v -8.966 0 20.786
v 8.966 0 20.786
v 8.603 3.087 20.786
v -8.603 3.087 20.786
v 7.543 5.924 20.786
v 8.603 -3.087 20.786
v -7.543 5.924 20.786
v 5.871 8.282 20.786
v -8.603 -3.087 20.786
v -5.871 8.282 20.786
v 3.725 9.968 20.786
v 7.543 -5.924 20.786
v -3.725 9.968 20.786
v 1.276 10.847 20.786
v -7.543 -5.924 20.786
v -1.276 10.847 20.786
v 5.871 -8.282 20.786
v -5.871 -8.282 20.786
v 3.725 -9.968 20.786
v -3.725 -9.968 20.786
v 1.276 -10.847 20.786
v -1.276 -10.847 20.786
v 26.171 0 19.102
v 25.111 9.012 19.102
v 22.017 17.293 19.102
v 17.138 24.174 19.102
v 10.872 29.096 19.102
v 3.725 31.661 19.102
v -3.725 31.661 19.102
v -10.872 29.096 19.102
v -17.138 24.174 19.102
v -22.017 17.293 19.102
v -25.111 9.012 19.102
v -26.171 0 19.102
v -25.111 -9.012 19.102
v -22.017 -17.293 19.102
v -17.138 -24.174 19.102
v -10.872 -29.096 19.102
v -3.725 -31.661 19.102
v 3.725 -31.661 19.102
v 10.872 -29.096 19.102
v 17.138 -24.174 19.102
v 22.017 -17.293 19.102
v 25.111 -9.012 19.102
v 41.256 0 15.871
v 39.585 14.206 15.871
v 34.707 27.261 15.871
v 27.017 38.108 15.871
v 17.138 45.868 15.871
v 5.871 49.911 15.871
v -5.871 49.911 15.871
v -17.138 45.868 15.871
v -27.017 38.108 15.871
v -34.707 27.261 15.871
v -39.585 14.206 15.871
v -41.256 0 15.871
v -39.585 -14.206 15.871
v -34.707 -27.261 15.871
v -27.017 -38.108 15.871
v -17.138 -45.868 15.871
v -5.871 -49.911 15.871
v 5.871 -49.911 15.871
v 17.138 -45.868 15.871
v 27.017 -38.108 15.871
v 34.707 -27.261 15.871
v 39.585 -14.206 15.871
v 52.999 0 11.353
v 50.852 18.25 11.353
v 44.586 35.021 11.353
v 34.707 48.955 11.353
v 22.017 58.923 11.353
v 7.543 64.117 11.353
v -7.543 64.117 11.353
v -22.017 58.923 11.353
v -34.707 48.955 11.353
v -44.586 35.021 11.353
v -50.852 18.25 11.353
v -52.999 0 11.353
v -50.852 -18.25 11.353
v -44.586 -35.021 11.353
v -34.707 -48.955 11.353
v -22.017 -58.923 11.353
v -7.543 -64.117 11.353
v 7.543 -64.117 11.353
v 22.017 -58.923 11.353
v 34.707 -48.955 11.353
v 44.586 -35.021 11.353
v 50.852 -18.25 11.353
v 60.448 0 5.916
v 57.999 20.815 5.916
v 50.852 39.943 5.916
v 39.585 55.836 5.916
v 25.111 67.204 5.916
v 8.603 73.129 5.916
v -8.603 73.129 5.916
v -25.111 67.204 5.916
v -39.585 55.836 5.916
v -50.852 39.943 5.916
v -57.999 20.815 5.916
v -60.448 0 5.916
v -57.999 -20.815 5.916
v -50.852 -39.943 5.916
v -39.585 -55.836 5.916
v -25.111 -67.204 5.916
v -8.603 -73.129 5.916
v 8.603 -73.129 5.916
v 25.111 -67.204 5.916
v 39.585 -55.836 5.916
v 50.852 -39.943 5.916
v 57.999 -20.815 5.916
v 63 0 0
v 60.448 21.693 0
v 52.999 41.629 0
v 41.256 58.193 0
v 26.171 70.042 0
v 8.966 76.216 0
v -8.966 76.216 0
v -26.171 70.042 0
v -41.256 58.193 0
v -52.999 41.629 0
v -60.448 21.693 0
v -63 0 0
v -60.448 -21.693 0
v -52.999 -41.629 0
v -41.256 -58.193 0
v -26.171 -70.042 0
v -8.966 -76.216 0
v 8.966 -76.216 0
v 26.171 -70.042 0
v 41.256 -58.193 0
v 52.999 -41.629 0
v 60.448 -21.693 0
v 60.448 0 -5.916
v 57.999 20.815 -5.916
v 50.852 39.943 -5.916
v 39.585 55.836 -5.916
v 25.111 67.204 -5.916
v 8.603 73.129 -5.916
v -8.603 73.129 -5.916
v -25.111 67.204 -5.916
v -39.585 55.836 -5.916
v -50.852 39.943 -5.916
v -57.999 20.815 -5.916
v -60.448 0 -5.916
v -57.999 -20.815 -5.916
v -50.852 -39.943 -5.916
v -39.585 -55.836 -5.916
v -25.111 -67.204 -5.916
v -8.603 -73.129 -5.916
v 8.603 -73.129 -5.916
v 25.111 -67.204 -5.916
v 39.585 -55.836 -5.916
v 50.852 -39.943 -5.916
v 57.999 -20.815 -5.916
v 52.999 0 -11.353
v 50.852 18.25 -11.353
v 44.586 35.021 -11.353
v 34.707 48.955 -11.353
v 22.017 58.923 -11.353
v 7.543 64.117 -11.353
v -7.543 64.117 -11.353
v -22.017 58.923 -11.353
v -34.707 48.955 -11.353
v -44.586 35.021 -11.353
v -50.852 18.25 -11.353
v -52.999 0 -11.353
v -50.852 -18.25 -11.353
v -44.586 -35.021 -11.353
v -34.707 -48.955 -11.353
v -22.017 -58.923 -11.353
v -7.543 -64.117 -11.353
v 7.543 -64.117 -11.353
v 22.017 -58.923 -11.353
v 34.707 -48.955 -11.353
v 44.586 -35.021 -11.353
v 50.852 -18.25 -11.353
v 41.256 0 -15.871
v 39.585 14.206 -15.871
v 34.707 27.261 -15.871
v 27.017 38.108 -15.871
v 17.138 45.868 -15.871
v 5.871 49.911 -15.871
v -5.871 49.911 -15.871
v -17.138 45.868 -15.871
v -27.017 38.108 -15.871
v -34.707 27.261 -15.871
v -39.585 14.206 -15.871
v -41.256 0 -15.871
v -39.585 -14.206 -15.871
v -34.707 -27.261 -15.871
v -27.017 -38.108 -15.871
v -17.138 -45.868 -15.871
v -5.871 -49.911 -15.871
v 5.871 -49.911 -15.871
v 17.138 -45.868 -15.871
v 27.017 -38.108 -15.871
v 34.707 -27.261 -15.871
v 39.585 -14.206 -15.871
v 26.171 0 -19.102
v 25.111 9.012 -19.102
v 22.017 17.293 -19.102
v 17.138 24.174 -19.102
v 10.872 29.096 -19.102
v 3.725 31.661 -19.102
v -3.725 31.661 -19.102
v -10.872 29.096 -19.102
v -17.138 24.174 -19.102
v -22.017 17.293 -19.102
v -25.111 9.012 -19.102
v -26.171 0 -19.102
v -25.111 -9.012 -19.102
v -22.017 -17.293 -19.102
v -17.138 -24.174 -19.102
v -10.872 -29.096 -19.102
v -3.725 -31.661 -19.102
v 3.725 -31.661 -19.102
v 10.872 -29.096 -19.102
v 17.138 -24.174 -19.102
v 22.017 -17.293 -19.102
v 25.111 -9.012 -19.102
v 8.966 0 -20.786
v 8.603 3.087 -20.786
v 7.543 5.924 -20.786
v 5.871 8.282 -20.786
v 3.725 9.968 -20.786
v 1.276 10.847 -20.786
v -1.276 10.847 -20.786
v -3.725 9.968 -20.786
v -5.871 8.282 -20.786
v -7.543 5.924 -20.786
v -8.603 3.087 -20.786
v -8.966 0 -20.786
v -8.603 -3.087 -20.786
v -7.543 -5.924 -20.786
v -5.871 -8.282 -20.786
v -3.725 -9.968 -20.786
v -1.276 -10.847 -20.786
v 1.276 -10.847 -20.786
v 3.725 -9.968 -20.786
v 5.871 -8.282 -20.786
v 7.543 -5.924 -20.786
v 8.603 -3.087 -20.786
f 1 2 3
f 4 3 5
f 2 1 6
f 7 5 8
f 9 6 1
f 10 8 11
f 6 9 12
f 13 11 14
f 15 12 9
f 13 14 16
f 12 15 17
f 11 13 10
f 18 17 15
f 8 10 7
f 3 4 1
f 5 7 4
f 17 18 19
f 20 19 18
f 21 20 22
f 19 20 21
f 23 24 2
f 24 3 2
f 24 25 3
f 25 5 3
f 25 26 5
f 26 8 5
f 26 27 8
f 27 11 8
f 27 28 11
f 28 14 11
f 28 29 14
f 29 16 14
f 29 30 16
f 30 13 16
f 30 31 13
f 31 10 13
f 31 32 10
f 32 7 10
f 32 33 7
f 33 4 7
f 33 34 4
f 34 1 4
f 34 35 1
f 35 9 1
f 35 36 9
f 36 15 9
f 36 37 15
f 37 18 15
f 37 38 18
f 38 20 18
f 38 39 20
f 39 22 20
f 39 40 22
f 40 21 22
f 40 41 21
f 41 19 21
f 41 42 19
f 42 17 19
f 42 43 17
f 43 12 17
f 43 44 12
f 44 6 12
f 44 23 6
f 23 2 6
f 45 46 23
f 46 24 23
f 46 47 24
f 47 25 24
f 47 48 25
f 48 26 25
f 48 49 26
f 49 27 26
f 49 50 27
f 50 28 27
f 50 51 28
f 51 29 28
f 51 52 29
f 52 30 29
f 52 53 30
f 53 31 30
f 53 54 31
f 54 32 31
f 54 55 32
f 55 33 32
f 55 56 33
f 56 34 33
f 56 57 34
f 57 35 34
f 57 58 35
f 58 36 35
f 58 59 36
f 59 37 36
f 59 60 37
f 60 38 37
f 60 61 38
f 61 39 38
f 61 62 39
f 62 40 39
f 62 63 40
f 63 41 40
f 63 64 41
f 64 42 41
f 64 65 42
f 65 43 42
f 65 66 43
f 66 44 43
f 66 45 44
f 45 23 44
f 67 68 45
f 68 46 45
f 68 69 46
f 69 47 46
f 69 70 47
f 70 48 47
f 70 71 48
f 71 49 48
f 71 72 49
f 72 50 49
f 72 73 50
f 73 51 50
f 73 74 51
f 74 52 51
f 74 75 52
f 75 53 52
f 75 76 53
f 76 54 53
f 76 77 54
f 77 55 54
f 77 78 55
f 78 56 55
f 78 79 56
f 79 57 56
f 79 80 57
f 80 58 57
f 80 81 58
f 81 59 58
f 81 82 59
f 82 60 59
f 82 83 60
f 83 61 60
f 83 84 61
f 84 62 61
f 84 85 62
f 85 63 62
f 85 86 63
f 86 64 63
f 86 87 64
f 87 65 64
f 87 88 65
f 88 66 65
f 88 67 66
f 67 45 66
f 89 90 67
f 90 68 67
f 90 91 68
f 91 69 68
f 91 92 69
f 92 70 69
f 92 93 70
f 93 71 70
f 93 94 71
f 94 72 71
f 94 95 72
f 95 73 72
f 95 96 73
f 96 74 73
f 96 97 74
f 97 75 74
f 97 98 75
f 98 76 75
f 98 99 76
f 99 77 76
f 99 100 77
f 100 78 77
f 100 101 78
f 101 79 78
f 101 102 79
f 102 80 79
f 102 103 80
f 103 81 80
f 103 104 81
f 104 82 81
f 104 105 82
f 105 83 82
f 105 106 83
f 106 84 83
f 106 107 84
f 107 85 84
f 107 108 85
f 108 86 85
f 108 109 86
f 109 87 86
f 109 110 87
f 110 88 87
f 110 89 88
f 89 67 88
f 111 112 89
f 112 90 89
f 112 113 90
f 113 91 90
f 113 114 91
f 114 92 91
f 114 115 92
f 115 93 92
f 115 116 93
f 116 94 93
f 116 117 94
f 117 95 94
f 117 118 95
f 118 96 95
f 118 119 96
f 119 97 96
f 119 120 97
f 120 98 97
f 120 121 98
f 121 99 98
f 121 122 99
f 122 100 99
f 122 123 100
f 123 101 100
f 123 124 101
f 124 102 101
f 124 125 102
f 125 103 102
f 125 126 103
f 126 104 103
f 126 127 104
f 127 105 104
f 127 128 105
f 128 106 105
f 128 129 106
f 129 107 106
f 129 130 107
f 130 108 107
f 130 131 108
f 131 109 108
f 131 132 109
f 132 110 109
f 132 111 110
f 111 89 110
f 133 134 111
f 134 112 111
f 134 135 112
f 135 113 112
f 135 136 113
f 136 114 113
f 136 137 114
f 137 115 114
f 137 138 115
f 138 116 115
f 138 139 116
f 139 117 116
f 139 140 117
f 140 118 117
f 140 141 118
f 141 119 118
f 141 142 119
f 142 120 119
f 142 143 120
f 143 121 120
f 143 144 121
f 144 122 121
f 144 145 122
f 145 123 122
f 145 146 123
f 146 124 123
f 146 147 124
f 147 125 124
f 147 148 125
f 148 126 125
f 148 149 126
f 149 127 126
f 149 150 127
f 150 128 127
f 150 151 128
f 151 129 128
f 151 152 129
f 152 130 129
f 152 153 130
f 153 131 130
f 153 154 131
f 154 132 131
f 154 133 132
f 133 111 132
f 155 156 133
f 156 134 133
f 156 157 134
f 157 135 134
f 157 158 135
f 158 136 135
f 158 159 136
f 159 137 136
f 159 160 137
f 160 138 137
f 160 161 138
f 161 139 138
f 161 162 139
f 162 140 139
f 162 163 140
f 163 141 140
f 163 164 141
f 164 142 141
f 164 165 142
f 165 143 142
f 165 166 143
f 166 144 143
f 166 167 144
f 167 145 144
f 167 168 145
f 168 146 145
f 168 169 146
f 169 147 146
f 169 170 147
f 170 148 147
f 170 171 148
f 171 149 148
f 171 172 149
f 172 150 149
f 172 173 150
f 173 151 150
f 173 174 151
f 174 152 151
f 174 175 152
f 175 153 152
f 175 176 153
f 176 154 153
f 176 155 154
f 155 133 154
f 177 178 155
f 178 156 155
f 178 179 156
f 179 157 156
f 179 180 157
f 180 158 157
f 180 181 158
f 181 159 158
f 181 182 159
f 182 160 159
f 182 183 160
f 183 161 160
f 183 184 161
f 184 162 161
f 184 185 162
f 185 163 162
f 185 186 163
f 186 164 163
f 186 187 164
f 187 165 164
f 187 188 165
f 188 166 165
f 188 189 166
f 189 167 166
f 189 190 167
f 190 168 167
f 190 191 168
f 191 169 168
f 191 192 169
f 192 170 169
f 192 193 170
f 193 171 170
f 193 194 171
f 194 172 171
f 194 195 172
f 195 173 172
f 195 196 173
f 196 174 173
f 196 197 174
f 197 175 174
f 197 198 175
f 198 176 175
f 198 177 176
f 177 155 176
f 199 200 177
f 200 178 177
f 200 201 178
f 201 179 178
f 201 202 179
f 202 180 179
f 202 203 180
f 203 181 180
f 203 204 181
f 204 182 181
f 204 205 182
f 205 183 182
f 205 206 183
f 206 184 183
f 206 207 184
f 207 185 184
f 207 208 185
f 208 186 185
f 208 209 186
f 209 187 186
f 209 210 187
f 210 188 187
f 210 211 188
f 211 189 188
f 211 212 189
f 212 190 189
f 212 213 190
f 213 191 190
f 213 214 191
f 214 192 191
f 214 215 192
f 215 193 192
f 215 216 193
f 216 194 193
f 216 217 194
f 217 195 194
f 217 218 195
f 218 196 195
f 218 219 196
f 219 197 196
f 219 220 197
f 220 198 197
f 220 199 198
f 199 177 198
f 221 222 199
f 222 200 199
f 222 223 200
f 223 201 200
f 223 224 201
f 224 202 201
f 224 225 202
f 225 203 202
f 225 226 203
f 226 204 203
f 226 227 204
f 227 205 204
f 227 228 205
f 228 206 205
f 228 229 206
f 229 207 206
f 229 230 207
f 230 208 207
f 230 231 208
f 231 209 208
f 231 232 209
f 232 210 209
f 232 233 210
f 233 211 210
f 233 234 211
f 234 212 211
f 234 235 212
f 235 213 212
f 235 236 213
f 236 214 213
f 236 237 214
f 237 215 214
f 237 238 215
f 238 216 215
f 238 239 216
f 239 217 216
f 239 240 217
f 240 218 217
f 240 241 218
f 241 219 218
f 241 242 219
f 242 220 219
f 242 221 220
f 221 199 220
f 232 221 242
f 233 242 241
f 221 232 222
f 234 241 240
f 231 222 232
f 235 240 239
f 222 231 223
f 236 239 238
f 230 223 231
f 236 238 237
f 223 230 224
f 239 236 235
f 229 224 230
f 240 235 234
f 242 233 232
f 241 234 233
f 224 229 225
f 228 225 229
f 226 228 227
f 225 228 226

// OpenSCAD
// Generated by SolidPython 1.0.1 on 2020-07-29 00:46:48


scale(v = [9, 11, 3]) {
	sphere(r = 7);
}
/***********************************************
*********      SolidPython code:      **********
************************************************
 
# import packages: SolidPython
from solid import *
from solid.utils import *
from itertools import chain, combinations, permutations


class Resize:

    def __init__(self, scad_file):
        self.scad_file = scad_file
        #self.scad_file = import_scad(scad_file)
        # cone/cylinder param:
        self.r1 = 0
        self.r2 = 0
        self.h = 0
        # rectangular prism param:
        self.w = 0
        self.l = 0
        # ellipse param:
        self.r = 0

    # import OpenScad code (file name corresponds to shape)


    # classify shape + parameters
    def assign(self, param1, param2, param3):
        if self.scad_file == 'cone.scad':
            self.r1 = param1
            self.r2 = param2
            self.h = param3
        elif self.scad_file == 'cylinder.scad':
            self.r1 = param1
            self.r2 = param2
            self.h = param3
        elif self.scad_file == 'rectangularPrism.scad':
            self.h = param1
            self.l = param2
            self.w = param3
        else:
            self.r = param1
            self.h = param2

    # resize parameters
    def iterate(self):
        x = range(3, 20, 2)
        i = 1
        if self.scad_file == 'cone.scad':
            tempList = list(permutations(x, 2))
            for temp in tempList:
                param1 = temp[0]
                param2 = temp[1]
                filepath = 'produced_scad_files/' + 'cone' + str(param1) + '_' + str(param2) + '_' + '.scad'
                scad_render_to_file(cylinder(h=param1, r1=param2, r2=0), filepath)

        elif self.scad_file == 'cylinder.scad':
            tempList = list(permutations(x, 3))
            for temp in tempList:
                param1 = temp[0]
                param2 = temp[1]
                filepath = 'produced_scad_files/' + 'cylinder' + str(param1) + '_' + str(param2) + '_' + '.scad'
                scad_render_to_file(cylinder(h=param1, r1=param2, r2=param2), filepath)

        elif self.scad_file == 'rectangularPrism.scad':
            tempList = list(permutations(x, 3))
            for temp in tempList:
                param1 = temp[0]
                param2 = temp[1]
                param3 = temp[2]
                filepath = 'produced_scad_files/' + 'rectangularPrism' + str(param1) + '_' + str(param2) + '_' + str(
                    param3) + '.scad'
                scad_render_to_file(cube(size=(param1, param2, param3)), filepath)

        elif self.scad_file == 'ellipse.scad':
            tempList = list(permutations(x, 4))
            for temp in tempList:
                param1 = temp[0]
                param2 = temp[1]
                param3 = temp[2]
                param4 = temp[3]
                filepath = 'produced_scad_files/' + 'ellipse' + str(param1) + '_' + str(param2) + '_' + str(param3) + '_' + str(param4) + '.scad'
                scad_render_to_file(scale([param1, param2, param3])(sphere(r=param4)), filepath)

    def render_to_scadfile(self):
        scad_render_to_file(scad, 'example.scad') 
 
************************************************/
